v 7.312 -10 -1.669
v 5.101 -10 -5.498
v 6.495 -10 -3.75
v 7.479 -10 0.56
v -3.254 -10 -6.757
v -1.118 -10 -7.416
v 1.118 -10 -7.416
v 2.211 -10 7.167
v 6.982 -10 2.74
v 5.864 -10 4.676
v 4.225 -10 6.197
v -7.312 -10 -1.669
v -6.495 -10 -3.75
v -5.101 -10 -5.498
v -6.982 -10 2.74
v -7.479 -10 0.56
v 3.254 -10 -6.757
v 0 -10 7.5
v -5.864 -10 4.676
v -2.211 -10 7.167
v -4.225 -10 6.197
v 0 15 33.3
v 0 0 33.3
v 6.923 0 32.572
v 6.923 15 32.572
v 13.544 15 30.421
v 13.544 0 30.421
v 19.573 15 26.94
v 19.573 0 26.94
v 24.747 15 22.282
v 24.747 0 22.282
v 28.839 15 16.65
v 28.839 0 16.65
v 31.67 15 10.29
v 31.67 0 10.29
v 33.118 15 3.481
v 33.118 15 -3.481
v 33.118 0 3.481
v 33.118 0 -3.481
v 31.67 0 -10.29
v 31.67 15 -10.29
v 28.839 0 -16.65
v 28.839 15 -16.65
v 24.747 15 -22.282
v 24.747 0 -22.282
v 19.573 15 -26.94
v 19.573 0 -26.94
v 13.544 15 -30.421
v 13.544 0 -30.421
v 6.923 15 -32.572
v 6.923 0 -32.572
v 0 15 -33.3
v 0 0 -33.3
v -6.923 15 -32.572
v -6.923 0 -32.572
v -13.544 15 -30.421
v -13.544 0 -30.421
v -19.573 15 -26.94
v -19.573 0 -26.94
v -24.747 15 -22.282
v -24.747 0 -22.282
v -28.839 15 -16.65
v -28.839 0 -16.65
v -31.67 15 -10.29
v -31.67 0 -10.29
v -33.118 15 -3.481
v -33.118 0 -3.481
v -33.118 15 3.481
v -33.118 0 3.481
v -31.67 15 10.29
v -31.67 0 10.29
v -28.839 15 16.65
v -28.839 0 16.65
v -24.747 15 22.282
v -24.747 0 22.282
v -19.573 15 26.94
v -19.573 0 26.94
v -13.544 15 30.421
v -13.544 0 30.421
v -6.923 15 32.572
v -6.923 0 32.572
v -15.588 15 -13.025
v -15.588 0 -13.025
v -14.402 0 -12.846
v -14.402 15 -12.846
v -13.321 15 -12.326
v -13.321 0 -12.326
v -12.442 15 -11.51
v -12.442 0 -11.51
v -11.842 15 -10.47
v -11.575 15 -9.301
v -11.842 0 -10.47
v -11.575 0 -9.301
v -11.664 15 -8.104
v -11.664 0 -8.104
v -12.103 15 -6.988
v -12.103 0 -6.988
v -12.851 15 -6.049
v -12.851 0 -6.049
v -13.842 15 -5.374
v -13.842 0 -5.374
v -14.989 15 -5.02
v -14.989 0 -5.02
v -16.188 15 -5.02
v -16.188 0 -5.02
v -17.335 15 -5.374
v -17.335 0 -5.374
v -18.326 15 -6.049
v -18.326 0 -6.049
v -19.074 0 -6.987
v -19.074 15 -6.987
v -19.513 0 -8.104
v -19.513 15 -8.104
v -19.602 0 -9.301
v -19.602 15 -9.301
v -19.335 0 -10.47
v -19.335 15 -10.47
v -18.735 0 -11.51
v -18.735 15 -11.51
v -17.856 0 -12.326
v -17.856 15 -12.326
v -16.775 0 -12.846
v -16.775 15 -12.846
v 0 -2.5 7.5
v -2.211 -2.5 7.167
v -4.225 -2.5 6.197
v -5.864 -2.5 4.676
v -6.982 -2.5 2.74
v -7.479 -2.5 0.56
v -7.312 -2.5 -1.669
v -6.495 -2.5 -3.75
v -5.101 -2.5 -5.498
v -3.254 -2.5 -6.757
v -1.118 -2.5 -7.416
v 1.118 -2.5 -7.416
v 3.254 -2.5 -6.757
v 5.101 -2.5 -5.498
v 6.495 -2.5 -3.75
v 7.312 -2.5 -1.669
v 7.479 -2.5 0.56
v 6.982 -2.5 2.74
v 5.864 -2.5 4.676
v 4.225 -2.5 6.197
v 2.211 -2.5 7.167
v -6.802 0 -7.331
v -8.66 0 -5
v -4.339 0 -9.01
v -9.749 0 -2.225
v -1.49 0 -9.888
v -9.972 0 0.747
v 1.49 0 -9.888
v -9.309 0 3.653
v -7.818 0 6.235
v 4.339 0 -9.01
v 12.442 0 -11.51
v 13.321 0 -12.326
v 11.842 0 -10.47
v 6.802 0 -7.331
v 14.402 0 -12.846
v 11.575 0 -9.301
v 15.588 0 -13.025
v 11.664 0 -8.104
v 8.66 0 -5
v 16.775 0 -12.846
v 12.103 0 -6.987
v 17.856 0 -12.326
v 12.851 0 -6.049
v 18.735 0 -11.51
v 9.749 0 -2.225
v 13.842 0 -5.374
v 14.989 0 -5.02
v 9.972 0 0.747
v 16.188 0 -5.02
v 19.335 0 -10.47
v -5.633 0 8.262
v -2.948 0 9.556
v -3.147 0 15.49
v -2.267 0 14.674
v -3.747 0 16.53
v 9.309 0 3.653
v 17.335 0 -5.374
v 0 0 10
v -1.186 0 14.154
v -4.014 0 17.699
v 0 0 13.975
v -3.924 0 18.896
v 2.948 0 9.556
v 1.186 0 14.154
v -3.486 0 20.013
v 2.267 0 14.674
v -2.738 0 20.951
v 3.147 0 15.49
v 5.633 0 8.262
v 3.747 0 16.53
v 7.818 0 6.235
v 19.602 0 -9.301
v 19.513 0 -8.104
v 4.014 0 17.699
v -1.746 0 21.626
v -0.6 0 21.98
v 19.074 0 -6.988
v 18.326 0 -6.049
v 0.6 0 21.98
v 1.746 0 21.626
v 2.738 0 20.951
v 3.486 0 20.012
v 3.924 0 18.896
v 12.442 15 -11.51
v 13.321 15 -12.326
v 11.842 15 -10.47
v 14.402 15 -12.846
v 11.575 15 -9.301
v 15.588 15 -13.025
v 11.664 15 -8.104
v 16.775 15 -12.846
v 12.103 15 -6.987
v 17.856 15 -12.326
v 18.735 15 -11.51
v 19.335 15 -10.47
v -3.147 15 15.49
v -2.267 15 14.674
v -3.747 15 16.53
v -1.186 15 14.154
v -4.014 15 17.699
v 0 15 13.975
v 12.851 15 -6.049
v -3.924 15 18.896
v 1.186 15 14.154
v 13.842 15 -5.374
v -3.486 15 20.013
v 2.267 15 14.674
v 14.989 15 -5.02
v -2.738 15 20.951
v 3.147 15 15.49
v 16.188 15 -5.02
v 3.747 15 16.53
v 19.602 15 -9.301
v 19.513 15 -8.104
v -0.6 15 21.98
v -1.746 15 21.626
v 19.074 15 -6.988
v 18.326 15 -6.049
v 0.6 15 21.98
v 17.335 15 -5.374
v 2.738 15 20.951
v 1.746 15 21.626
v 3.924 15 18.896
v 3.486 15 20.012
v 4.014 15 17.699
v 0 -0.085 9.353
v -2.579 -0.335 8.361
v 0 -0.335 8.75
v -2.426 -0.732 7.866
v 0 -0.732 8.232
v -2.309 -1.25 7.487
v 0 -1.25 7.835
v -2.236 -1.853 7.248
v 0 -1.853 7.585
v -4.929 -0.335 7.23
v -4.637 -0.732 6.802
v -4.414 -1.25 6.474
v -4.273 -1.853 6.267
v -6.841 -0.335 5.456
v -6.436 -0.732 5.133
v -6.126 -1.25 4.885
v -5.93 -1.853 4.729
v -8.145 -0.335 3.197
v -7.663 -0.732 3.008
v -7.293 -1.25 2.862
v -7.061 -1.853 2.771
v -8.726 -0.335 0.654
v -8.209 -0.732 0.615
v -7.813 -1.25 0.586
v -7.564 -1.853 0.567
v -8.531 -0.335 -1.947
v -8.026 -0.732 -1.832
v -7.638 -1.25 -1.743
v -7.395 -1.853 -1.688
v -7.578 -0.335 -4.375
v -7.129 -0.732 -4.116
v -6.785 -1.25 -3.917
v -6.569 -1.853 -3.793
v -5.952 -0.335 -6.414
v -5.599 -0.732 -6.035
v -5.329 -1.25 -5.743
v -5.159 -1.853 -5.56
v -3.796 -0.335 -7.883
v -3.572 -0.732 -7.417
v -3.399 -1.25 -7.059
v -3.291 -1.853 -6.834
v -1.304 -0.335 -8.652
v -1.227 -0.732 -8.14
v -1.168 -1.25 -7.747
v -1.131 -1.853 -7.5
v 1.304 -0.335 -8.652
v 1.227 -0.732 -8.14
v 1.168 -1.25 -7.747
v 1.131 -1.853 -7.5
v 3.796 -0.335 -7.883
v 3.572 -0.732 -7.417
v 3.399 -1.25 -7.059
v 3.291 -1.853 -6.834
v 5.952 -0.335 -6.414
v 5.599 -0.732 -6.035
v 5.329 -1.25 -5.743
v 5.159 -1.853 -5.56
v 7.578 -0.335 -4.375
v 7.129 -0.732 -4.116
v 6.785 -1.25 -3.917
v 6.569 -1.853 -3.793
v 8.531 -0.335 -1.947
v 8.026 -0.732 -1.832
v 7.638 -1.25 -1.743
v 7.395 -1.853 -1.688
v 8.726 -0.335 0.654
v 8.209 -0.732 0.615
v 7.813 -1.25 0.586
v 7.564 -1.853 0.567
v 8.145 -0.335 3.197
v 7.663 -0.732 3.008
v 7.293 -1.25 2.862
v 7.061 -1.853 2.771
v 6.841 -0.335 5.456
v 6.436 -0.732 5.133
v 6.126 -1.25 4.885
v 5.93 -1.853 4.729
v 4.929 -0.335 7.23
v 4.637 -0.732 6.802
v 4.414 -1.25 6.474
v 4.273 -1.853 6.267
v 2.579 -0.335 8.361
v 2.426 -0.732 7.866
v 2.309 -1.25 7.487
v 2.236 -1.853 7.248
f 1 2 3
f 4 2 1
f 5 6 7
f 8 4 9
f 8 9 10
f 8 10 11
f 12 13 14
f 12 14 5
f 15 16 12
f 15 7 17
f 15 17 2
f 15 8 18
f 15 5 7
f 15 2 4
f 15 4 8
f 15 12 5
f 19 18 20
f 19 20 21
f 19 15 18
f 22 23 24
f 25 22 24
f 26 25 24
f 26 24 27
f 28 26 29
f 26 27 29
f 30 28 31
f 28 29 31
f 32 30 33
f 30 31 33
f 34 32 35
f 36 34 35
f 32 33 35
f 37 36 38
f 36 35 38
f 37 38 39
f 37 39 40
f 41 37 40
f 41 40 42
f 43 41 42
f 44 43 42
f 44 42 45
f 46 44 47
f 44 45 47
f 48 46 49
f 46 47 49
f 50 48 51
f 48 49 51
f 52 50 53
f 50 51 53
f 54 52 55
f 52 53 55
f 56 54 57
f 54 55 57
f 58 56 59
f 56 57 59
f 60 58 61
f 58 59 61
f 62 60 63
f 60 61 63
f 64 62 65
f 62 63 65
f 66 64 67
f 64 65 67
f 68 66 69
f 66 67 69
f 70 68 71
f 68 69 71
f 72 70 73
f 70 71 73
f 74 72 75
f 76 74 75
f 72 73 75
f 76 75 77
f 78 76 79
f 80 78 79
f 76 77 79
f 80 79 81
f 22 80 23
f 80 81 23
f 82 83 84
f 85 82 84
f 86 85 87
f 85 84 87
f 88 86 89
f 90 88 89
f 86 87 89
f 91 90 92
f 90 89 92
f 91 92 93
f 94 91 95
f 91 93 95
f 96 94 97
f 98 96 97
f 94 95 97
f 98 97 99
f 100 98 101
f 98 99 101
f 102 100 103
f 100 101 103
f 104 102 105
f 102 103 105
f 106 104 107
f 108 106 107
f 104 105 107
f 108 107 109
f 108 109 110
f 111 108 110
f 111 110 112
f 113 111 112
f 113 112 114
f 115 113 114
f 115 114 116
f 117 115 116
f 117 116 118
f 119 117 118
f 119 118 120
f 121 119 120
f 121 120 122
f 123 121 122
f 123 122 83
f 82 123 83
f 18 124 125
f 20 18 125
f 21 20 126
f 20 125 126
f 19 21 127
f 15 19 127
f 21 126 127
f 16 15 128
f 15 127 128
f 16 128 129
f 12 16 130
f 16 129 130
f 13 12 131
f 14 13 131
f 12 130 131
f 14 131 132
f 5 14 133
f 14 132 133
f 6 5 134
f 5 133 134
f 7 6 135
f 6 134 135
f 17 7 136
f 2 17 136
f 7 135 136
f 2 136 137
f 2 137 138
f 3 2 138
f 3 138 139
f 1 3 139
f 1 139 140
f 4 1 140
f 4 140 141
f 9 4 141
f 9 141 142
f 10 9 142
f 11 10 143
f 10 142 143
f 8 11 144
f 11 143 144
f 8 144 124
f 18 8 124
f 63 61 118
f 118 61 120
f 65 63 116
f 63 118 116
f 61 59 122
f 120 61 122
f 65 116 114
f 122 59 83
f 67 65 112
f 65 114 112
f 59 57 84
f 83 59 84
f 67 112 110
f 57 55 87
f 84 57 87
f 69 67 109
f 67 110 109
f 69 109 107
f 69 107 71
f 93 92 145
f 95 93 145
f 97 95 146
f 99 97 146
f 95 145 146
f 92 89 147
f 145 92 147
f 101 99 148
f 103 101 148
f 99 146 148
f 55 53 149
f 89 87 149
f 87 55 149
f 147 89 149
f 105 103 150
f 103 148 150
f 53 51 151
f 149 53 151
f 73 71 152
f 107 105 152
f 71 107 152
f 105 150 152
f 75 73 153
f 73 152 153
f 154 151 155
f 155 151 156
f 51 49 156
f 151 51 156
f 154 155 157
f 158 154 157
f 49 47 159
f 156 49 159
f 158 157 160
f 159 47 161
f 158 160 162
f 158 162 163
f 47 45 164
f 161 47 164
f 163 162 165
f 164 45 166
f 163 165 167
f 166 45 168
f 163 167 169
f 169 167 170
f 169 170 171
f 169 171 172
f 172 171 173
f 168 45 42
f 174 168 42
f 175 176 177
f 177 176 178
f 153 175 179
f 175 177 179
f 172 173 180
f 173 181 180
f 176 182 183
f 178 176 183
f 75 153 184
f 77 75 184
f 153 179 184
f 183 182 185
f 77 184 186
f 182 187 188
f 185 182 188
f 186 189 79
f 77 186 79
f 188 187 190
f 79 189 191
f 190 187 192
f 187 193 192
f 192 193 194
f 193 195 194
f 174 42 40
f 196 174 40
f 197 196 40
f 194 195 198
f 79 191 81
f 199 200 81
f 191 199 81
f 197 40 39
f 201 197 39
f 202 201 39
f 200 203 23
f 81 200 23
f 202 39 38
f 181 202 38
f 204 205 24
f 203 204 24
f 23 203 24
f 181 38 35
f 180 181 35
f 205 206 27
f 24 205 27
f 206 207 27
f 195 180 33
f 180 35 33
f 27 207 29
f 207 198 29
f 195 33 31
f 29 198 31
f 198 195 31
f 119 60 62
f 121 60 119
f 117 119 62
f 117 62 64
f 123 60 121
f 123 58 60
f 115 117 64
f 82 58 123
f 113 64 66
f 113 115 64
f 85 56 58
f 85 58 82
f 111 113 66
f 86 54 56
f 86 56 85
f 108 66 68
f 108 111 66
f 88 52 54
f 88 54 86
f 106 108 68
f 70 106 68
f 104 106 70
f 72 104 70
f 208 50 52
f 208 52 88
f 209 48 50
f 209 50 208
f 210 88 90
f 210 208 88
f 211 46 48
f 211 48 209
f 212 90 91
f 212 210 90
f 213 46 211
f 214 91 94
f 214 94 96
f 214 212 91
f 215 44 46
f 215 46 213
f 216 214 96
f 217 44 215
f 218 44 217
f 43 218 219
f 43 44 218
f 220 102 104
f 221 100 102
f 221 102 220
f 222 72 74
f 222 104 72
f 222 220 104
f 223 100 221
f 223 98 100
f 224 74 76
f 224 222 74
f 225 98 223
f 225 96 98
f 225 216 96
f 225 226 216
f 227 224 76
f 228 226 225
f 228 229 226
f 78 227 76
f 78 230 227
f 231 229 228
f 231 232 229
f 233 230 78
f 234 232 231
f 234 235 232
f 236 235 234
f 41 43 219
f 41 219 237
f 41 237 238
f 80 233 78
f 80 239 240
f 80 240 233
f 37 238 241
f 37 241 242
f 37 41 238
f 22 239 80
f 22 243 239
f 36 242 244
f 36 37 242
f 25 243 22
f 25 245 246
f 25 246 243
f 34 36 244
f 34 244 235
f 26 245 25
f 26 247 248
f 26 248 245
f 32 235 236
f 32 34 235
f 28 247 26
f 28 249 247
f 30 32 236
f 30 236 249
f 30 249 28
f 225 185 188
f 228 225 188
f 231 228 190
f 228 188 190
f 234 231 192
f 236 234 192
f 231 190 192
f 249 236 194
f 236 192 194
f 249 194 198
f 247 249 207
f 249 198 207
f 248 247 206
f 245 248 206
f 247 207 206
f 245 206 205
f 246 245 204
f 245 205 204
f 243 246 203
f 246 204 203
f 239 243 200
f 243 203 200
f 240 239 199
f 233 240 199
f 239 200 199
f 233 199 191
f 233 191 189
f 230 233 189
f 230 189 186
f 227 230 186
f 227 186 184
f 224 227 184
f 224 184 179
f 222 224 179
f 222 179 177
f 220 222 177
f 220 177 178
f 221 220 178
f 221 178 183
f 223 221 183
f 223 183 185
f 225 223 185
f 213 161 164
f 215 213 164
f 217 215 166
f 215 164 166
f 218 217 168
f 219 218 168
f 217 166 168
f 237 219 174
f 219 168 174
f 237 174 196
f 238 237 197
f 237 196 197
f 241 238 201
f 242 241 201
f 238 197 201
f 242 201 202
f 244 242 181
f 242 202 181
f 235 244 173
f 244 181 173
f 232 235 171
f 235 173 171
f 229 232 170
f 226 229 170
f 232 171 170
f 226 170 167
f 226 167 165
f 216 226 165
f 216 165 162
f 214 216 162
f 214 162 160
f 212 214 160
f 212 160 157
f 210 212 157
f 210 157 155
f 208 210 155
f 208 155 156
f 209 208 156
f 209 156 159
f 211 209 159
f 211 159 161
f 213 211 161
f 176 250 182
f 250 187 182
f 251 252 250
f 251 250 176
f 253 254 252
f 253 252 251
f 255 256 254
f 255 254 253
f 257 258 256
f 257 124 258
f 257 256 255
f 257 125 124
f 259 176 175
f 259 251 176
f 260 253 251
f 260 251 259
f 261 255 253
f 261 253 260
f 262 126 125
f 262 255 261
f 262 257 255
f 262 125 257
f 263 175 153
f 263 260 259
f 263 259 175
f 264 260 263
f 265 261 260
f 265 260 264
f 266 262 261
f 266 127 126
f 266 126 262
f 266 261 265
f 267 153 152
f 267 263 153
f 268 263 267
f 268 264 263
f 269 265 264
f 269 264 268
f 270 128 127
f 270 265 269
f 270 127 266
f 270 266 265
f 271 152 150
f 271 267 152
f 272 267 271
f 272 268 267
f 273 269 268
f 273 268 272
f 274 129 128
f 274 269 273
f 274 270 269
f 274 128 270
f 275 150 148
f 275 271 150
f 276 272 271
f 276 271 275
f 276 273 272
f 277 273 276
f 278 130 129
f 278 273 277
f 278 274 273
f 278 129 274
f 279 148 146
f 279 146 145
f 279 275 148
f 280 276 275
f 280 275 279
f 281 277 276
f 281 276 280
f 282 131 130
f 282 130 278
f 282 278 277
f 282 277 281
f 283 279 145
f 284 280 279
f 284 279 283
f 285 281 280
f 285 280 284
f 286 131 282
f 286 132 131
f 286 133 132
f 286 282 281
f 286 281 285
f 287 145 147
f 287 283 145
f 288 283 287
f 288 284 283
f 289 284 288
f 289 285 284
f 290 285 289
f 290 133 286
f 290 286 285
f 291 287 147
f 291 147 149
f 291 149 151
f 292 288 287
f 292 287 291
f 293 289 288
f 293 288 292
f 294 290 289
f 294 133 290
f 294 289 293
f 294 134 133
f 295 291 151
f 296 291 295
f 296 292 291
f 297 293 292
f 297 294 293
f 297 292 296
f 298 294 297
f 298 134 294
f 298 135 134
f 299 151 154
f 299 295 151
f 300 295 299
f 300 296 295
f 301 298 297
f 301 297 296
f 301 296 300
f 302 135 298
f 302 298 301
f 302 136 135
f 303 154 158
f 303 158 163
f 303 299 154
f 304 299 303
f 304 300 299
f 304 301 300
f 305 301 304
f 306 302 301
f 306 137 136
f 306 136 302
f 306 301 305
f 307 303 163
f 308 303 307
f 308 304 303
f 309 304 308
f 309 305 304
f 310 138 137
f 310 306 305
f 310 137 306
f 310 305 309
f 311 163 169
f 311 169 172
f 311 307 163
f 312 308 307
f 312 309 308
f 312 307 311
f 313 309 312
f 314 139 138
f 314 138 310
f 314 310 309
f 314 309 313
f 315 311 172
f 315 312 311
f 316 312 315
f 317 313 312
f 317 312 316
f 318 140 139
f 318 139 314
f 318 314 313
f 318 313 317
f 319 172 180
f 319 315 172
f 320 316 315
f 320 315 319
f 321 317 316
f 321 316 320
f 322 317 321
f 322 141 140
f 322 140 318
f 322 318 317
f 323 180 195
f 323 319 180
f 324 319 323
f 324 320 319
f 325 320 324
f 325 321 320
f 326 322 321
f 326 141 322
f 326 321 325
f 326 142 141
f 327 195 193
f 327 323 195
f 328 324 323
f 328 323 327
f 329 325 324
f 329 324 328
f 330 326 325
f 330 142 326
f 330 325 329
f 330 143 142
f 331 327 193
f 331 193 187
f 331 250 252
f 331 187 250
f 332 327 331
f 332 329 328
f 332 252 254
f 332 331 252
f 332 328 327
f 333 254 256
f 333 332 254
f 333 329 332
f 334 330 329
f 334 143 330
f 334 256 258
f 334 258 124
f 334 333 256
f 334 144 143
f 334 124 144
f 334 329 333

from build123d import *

# Parameters (mm, degrees)
SKETCH4_R           = 33.3
BOSS_EXTRUDE2_DEPTH = 15
SKETCH5_R           = 4.025
CUT_EXTRUDE1_DEPTH  = 50.424487858
SKETCH6_R           = 7.5
BOSS_EXTRUDE3_DEPTH = 10
FILLET1_R           = 2.5


with BuildPart() as part:
    # Sketch4 → Boss-Extrude2 (new body)
    with BuildSketch(Plane(origin=(0, 0, 0), x_dir=(1, 0, 0), z_dir=(0, 1, 0))):
        with Locations(Location((0, 0, 0), (0, 0, 270))):
            Circle(SKETCH4_R)
    extrude(amount=BOSS_EXTRUDE2_DEPTH)

    # Sketch5 → Cut-Extrude1 (cut, through all)
    with BuildSketch(Plane.XZ):
        with Locations(Location((0, 18, 0), (0, 0, 270))):
            Circle(SKETCH5_R)
        with Locations(Location((15.588457268, -9, 0), (0, 0, 270))):
            Circle(SKETCH5_R)
        with Locations(Location((-15.588457268, -9, 0), (0, 0, 270))):
            Circle(SKETCH5_R)
    extrude(amount=-CUT_EXTRUDE1_DEPTH, mode=Mode.SUBTRACT)

    # Sketch6 → Boss-Extrude3 (add)
    with BuildSketch(Plane.XZ):
        with Locations(Location((0, 0, 0), (0, 0, 90))):
            Circle(SKETCH6_R)
    extrude(amount=BOSS_EXTRUDE3_DEPTH)

    # Fillet1
    fillet1_edges = [part.edges().sort_by_distance(p)[0] for p in [
        (0, 0, -7.5),
    ]]
    fillet(fillet1_edges, radius=FILLET1_R)


solid = part.part
